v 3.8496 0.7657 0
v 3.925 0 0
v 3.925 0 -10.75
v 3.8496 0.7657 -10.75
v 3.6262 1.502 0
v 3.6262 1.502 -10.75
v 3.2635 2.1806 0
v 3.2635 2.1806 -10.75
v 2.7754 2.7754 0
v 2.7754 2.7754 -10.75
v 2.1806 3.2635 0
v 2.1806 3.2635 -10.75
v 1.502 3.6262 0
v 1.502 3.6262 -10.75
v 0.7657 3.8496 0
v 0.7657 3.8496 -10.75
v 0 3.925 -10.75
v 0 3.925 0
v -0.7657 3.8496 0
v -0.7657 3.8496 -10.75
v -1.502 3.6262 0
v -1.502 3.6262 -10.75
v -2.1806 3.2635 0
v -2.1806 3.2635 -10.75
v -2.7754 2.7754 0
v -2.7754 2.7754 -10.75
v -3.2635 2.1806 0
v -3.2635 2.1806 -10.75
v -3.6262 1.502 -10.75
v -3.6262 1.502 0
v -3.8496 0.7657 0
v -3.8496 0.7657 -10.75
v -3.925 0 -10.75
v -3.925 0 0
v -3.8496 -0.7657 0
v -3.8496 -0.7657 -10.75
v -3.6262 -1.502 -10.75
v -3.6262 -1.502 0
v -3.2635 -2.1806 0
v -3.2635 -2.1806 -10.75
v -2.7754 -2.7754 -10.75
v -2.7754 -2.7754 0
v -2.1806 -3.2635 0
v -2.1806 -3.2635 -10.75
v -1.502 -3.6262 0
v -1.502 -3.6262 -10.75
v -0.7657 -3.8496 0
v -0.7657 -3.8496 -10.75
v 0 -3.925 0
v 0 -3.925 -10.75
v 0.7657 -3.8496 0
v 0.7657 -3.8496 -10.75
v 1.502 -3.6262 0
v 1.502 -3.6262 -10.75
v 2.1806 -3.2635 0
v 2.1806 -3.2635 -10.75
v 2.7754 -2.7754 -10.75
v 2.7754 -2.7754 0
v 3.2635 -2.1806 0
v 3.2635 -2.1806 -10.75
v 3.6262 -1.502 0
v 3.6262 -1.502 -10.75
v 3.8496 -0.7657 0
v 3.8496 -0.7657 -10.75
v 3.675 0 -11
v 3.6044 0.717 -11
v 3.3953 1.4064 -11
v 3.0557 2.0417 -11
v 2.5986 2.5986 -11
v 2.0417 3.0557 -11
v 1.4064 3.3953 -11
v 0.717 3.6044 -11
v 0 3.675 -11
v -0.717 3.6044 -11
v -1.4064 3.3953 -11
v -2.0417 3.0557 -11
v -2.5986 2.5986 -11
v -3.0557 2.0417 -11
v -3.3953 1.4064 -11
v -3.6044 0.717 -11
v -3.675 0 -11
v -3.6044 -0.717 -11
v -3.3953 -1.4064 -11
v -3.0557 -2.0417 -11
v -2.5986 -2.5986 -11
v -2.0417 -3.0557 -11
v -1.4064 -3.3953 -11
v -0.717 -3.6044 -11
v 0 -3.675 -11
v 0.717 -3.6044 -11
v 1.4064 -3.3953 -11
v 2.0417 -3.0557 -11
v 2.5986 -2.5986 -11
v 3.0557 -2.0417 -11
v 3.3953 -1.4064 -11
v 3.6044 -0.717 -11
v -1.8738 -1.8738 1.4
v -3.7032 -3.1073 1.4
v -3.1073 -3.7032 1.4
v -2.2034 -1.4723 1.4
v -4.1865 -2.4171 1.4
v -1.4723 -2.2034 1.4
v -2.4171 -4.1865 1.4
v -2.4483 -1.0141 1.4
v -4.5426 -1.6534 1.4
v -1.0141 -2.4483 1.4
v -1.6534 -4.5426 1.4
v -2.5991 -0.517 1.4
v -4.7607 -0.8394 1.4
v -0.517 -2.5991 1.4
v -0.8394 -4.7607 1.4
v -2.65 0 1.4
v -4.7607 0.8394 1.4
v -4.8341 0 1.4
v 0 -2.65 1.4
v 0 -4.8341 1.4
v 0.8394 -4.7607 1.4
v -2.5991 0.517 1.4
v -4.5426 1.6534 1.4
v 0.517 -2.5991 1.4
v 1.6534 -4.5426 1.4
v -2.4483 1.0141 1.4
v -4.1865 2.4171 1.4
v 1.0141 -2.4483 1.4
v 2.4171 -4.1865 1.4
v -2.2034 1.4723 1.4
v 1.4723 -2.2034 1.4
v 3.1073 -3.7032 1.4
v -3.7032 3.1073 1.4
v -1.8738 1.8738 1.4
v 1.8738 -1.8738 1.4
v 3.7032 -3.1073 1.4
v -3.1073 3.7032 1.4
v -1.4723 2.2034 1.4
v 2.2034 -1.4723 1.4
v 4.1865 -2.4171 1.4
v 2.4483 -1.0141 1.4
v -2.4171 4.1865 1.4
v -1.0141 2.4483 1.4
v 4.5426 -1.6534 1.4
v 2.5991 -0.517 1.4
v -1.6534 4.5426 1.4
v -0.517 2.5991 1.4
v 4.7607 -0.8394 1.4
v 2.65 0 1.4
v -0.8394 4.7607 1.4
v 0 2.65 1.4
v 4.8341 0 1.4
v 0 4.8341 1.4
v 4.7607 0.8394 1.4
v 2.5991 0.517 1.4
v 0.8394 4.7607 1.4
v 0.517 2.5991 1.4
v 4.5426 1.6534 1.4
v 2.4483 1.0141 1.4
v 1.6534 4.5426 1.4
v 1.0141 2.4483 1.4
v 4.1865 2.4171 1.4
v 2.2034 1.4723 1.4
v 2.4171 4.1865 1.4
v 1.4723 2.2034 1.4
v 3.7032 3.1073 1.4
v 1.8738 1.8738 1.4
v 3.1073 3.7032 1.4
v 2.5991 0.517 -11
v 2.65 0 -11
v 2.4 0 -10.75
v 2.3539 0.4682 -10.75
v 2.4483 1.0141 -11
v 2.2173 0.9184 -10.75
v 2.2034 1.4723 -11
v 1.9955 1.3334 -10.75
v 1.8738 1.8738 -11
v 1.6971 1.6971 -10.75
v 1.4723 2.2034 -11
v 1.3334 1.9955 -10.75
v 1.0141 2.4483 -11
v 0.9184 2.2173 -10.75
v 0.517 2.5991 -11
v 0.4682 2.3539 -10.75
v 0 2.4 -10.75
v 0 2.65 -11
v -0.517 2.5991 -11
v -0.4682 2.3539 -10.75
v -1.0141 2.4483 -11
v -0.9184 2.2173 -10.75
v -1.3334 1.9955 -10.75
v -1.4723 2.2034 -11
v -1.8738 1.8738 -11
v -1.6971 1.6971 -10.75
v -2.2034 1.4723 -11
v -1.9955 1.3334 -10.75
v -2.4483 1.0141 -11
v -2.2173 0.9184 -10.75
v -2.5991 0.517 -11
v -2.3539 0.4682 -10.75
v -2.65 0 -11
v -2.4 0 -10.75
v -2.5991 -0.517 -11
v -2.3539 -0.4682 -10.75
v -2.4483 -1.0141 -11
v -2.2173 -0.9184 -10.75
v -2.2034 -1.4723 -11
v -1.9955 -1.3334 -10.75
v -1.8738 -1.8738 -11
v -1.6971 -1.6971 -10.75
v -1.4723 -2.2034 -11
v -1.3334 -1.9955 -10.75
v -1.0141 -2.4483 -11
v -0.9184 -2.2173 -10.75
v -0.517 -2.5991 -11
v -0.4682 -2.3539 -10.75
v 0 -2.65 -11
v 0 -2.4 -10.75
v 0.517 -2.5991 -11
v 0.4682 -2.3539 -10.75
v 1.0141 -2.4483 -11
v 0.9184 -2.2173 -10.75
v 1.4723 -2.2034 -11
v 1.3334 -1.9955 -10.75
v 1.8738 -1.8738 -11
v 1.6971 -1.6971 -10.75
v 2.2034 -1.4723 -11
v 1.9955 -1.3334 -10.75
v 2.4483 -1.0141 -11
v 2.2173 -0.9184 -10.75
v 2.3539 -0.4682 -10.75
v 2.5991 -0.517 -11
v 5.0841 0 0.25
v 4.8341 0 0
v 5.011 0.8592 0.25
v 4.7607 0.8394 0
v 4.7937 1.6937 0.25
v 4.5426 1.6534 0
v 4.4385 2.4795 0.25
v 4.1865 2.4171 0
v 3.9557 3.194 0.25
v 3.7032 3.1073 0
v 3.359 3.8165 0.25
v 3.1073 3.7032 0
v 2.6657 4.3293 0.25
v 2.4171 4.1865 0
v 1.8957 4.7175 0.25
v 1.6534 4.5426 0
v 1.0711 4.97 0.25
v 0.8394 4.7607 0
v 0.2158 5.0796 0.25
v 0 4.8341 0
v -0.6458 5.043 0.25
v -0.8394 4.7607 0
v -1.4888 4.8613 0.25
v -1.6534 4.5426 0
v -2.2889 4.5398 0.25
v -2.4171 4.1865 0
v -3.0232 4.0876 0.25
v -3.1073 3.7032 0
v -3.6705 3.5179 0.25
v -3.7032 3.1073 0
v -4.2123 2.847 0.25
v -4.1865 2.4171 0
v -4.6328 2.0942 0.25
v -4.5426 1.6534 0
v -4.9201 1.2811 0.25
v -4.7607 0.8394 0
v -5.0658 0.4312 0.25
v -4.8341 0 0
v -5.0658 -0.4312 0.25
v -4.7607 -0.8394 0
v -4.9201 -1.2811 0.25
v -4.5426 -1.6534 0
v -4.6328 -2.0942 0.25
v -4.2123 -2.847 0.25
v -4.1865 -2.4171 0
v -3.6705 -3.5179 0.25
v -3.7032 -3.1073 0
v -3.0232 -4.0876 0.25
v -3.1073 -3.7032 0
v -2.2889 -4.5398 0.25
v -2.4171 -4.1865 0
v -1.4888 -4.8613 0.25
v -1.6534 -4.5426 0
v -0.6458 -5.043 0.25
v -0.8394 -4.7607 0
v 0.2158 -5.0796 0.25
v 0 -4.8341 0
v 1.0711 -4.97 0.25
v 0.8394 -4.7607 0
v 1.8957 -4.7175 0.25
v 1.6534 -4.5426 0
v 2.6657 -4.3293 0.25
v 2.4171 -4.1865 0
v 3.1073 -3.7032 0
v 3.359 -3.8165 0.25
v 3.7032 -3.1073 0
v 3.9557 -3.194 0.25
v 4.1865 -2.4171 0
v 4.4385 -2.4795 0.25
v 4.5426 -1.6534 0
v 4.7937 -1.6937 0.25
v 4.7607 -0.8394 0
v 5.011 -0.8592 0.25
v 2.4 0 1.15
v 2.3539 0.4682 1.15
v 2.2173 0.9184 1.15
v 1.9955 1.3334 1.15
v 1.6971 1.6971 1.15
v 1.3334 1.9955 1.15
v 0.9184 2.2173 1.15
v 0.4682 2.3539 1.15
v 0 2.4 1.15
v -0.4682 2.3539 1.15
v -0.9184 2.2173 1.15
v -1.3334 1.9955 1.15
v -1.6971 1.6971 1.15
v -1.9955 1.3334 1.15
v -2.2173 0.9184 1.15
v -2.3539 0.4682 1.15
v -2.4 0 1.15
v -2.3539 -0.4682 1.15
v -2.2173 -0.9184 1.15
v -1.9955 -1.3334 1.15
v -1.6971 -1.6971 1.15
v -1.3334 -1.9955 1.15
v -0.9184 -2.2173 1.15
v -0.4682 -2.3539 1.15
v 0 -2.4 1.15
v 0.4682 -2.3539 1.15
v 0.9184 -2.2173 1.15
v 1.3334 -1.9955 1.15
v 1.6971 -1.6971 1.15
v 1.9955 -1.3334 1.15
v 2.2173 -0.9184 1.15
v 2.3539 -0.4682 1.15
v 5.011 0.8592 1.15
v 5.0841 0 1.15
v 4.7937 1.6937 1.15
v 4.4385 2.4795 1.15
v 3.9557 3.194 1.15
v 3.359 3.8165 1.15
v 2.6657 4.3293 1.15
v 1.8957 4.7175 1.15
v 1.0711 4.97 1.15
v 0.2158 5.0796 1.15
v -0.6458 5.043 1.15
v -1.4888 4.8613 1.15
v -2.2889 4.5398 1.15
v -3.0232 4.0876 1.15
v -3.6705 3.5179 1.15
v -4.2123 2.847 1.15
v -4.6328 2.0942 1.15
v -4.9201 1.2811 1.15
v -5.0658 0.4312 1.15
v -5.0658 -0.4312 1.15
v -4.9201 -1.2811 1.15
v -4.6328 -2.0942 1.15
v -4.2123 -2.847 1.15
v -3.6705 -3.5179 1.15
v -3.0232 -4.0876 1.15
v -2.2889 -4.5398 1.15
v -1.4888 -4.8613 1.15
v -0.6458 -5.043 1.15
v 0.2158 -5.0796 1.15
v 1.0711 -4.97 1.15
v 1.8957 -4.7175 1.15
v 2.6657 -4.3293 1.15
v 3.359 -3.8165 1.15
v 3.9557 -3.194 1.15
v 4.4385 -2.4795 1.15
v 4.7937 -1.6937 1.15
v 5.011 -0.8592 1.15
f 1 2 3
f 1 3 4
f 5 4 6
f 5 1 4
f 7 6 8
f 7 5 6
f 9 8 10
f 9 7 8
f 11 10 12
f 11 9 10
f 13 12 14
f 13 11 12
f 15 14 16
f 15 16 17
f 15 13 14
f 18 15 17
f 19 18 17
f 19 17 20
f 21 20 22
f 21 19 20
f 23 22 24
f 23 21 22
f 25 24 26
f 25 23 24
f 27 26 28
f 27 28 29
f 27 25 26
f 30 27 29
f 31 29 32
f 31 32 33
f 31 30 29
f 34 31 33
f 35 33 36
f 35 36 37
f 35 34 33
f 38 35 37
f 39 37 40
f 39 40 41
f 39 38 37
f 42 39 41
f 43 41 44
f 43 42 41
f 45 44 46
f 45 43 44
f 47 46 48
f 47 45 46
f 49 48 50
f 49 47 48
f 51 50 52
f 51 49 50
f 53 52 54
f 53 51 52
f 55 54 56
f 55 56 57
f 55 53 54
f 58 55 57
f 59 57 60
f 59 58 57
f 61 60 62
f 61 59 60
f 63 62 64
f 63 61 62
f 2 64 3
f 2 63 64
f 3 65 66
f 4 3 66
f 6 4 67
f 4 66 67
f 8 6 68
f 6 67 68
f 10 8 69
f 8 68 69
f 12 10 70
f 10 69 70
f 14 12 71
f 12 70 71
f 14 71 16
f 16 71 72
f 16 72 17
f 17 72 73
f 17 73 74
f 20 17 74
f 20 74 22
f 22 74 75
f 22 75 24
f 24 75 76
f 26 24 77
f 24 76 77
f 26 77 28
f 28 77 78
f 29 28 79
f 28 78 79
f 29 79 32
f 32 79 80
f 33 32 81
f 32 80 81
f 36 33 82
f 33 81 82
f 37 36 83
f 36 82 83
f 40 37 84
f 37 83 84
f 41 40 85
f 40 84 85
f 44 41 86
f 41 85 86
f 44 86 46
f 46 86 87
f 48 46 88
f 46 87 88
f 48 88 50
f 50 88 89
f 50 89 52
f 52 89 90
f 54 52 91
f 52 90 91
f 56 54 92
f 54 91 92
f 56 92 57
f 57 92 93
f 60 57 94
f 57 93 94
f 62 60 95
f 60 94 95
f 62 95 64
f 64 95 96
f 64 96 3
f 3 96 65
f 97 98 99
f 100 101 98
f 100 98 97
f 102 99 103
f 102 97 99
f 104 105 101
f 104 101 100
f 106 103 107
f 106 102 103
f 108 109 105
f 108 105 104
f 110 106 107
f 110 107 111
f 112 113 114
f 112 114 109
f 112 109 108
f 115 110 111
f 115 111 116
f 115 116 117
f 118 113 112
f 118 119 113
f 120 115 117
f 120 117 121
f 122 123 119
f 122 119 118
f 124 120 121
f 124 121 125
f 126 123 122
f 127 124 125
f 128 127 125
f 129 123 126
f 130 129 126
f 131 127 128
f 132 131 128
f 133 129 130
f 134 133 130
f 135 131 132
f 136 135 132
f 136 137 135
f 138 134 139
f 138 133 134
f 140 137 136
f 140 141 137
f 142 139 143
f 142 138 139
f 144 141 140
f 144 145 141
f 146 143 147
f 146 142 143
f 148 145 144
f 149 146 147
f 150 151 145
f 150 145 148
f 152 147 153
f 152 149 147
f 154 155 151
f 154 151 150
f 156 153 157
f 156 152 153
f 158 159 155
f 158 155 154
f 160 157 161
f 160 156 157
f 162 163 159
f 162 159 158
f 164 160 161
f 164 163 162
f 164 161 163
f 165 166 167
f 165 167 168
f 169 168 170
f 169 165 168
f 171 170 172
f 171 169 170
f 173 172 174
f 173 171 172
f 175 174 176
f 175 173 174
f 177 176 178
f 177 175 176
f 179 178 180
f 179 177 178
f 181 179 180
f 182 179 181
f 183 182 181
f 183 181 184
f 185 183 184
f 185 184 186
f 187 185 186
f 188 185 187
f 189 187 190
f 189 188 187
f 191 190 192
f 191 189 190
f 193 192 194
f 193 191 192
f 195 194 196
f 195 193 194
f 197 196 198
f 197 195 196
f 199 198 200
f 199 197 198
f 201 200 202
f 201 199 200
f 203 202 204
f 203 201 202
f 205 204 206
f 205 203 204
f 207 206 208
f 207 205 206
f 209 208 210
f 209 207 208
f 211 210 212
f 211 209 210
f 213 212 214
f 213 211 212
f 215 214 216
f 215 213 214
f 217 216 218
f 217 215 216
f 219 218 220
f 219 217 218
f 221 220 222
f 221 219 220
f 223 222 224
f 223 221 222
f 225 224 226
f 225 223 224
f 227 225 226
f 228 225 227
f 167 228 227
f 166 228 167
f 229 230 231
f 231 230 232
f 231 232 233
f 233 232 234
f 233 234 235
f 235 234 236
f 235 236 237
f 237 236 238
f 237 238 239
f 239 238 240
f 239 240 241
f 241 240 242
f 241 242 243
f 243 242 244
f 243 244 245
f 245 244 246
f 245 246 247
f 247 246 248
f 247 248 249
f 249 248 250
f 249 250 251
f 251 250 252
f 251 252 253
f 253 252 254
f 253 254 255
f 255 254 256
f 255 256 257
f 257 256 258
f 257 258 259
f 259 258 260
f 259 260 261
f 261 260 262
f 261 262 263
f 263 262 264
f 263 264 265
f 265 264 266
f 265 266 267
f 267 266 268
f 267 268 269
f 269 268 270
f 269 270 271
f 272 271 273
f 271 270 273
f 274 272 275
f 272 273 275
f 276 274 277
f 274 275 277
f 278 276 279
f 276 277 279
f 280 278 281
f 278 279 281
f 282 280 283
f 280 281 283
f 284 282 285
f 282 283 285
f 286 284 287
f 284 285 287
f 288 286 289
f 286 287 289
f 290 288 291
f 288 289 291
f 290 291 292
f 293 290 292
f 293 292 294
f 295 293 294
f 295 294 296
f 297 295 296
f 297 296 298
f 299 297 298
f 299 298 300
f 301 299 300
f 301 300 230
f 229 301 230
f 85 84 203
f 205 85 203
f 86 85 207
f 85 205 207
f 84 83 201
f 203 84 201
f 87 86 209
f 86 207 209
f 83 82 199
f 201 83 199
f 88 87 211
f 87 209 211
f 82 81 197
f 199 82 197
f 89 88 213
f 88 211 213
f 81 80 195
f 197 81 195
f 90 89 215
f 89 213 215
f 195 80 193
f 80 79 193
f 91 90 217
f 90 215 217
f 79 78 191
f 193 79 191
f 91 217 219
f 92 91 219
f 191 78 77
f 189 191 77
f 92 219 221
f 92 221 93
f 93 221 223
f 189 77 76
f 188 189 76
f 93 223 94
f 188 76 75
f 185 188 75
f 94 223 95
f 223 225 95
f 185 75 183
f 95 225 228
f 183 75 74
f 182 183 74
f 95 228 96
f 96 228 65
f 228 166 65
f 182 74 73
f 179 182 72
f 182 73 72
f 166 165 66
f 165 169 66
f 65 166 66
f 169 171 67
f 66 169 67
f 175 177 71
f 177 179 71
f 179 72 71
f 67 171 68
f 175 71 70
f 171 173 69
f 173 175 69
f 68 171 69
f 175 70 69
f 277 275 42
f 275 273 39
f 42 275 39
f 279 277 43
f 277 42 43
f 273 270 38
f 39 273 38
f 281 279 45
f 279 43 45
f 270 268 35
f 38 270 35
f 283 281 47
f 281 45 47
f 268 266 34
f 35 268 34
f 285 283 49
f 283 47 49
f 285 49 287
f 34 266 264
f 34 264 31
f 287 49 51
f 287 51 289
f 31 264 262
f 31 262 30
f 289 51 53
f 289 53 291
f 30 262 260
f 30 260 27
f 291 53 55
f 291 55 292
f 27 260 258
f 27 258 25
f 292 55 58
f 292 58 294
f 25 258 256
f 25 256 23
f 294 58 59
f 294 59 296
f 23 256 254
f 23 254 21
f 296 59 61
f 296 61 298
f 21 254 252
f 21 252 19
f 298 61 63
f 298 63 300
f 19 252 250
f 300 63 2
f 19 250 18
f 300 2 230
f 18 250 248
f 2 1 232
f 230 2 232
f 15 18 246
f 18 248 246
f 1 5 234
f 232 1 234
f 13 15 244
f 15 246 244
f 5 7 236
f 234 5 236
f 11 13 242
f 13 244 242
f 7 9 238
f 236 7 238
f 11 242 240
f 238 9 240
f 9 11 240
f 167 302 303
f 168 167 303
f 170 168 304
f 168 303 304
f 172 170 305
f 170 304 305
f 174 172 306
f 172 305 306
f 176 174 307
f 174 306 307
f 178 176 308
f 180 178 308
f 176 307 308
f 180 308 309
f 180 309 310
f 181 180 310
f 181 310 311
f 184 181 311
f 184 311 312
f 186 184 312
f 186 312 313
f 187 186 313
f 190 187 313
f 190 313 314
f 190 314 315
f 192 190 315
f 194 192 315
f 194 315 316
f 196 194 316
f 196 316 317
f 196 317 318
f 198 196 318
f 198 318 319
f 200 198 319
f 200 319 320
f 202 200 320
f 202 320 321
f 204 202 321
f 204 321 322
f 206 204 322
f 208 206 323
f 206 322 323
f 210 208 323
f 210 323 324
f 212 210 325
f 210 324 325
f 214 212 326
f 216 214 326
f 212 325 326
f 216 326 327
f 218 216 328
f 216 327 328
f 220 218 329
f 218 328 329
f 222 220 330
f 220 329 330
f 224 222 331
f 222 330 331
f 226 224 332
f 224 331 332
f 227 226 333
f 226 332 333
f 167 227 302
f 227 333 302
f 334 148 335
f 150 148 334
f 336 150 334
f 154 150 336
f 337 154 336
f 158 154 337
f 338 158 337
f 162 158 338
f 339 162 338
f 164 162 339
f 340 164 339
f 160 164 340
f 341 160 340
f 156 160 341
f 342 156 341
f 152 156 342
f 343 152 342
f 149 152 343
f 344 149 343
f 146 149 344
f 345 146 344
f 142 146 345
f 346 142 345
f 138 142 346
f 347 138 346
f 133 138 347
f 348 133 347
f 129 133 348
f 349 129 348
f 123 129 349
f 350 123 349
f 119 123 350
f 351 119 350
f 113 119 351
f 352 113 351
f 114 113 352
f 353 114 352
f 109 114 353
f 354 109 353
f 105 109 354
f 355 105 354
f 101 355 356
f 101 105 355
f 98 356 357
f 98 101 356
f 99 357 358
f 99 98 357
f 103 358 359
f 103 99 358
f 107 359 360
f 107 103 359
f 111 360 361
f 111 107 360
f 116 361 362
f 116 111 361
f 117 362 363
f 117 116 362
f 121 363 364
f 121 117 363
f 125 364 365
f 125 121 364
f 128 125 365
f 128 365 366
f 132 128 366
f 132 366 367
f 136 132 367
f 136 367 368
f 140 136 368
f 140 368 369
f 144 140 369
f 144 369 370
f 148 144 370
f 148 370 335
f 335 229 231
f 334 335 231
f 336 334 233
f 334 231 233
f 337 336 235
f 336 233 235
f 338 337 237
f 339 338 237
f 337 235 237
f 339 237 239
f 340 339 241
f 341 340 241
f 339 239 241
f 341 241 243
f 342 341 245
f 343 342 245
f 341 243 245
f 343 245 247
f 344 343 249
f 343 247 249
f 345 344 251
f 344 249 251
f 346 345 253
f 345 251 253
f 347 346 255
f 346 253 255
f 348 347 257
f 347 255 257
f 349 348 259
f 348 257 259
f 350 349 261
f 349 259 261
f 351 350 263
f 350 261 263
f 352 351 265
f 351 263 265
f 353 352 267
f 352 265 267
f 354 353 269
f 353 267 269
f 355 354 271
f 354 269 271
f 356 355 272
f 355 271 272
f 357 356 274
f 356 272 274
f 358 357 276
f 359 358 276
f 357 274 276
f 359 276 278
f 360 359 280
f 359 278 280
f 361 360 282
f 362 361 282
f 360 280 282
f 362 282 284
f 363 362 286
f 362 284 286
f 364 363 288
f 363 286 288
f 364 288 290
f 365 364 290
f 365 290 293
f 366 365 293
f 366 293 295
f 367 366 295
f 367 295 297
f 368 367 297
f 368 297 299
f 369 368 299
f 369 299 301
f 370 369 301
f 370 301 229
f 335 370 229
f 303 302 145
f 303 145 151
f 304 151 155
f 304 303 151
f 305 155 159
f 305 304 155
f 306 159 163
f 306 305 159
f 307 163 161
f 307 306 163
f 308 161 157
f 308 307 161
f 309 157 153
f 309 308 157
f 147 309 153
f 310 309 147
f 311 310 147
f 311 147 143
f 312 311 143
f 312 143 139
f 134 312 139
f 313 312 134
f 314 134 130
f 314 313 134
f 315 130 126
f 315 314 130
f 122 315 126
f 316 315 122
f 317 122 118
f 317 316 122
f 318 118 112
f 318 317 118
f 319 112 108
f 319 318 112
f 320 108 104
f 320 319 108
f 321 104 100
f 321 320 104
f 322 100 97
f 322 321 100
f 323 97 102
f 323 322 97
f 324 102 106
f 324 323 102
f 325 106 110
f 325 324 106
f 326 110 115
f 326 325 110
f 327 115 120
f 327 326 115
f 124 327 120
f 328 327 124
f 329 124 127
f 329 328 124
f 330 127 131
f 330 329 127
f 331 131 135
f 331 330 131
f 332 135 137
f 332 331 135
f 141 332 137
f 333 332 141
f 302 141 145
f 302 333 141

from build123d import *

# Parameters (mm, degrees)
SKETCH1_R           = 3.925
BOSS_EXTRUDE1_DEPTH = 11
SKETCH2_R           = 5.084149635
BOSS_EXTRUDE2_DEPTH = 1.4
SKETCH3_R           = 2.4
CUT_EXTRUDE1_DEPTH  = 13.4
CHAMFER1_SIZE       = 0.25


with BuildPart() as part:
    # Sketch1 → Boss-Extrude1 (new body)
    with BuildSketch(Plane.XY):
        Circle(SKETCH1_R)
    extrude(amount=-BOSS_EXTRUDE1_DEPTH)

    # Sketch2 → Boss-Extrude2 (add)
    with BuildSketch(Plane.XY):
        Circle(SKETCH2_R)
    extrude(amount=BOSS_EXTRUDE2_DEPTH)

    # Sketch3 → Cut-Extrude1 (cut, through all)
    with BuildSketch(Plane.XY.offset(1.4)):
        Circle(SKETCH3_R)
    extrude(amount=-CUT_EXTRUDE1_DEPTH, mode=Mode.SUBTRACT)

    # Chamfer1
    chamfer1_edges = [part.edges().sort_by_distance(p)[0] for p in [
        (-2.4, 0, -11),
        (-2.4, 0, 1.4),
        (-3.925, 0, -11),
        (-5.084149635, 0, 0),
        (-5.084149635, 0, 1.4),
    ]]
    chamfer(chamfer1_edges, length=CHAMFER1_SIZE)


solid = part.part
